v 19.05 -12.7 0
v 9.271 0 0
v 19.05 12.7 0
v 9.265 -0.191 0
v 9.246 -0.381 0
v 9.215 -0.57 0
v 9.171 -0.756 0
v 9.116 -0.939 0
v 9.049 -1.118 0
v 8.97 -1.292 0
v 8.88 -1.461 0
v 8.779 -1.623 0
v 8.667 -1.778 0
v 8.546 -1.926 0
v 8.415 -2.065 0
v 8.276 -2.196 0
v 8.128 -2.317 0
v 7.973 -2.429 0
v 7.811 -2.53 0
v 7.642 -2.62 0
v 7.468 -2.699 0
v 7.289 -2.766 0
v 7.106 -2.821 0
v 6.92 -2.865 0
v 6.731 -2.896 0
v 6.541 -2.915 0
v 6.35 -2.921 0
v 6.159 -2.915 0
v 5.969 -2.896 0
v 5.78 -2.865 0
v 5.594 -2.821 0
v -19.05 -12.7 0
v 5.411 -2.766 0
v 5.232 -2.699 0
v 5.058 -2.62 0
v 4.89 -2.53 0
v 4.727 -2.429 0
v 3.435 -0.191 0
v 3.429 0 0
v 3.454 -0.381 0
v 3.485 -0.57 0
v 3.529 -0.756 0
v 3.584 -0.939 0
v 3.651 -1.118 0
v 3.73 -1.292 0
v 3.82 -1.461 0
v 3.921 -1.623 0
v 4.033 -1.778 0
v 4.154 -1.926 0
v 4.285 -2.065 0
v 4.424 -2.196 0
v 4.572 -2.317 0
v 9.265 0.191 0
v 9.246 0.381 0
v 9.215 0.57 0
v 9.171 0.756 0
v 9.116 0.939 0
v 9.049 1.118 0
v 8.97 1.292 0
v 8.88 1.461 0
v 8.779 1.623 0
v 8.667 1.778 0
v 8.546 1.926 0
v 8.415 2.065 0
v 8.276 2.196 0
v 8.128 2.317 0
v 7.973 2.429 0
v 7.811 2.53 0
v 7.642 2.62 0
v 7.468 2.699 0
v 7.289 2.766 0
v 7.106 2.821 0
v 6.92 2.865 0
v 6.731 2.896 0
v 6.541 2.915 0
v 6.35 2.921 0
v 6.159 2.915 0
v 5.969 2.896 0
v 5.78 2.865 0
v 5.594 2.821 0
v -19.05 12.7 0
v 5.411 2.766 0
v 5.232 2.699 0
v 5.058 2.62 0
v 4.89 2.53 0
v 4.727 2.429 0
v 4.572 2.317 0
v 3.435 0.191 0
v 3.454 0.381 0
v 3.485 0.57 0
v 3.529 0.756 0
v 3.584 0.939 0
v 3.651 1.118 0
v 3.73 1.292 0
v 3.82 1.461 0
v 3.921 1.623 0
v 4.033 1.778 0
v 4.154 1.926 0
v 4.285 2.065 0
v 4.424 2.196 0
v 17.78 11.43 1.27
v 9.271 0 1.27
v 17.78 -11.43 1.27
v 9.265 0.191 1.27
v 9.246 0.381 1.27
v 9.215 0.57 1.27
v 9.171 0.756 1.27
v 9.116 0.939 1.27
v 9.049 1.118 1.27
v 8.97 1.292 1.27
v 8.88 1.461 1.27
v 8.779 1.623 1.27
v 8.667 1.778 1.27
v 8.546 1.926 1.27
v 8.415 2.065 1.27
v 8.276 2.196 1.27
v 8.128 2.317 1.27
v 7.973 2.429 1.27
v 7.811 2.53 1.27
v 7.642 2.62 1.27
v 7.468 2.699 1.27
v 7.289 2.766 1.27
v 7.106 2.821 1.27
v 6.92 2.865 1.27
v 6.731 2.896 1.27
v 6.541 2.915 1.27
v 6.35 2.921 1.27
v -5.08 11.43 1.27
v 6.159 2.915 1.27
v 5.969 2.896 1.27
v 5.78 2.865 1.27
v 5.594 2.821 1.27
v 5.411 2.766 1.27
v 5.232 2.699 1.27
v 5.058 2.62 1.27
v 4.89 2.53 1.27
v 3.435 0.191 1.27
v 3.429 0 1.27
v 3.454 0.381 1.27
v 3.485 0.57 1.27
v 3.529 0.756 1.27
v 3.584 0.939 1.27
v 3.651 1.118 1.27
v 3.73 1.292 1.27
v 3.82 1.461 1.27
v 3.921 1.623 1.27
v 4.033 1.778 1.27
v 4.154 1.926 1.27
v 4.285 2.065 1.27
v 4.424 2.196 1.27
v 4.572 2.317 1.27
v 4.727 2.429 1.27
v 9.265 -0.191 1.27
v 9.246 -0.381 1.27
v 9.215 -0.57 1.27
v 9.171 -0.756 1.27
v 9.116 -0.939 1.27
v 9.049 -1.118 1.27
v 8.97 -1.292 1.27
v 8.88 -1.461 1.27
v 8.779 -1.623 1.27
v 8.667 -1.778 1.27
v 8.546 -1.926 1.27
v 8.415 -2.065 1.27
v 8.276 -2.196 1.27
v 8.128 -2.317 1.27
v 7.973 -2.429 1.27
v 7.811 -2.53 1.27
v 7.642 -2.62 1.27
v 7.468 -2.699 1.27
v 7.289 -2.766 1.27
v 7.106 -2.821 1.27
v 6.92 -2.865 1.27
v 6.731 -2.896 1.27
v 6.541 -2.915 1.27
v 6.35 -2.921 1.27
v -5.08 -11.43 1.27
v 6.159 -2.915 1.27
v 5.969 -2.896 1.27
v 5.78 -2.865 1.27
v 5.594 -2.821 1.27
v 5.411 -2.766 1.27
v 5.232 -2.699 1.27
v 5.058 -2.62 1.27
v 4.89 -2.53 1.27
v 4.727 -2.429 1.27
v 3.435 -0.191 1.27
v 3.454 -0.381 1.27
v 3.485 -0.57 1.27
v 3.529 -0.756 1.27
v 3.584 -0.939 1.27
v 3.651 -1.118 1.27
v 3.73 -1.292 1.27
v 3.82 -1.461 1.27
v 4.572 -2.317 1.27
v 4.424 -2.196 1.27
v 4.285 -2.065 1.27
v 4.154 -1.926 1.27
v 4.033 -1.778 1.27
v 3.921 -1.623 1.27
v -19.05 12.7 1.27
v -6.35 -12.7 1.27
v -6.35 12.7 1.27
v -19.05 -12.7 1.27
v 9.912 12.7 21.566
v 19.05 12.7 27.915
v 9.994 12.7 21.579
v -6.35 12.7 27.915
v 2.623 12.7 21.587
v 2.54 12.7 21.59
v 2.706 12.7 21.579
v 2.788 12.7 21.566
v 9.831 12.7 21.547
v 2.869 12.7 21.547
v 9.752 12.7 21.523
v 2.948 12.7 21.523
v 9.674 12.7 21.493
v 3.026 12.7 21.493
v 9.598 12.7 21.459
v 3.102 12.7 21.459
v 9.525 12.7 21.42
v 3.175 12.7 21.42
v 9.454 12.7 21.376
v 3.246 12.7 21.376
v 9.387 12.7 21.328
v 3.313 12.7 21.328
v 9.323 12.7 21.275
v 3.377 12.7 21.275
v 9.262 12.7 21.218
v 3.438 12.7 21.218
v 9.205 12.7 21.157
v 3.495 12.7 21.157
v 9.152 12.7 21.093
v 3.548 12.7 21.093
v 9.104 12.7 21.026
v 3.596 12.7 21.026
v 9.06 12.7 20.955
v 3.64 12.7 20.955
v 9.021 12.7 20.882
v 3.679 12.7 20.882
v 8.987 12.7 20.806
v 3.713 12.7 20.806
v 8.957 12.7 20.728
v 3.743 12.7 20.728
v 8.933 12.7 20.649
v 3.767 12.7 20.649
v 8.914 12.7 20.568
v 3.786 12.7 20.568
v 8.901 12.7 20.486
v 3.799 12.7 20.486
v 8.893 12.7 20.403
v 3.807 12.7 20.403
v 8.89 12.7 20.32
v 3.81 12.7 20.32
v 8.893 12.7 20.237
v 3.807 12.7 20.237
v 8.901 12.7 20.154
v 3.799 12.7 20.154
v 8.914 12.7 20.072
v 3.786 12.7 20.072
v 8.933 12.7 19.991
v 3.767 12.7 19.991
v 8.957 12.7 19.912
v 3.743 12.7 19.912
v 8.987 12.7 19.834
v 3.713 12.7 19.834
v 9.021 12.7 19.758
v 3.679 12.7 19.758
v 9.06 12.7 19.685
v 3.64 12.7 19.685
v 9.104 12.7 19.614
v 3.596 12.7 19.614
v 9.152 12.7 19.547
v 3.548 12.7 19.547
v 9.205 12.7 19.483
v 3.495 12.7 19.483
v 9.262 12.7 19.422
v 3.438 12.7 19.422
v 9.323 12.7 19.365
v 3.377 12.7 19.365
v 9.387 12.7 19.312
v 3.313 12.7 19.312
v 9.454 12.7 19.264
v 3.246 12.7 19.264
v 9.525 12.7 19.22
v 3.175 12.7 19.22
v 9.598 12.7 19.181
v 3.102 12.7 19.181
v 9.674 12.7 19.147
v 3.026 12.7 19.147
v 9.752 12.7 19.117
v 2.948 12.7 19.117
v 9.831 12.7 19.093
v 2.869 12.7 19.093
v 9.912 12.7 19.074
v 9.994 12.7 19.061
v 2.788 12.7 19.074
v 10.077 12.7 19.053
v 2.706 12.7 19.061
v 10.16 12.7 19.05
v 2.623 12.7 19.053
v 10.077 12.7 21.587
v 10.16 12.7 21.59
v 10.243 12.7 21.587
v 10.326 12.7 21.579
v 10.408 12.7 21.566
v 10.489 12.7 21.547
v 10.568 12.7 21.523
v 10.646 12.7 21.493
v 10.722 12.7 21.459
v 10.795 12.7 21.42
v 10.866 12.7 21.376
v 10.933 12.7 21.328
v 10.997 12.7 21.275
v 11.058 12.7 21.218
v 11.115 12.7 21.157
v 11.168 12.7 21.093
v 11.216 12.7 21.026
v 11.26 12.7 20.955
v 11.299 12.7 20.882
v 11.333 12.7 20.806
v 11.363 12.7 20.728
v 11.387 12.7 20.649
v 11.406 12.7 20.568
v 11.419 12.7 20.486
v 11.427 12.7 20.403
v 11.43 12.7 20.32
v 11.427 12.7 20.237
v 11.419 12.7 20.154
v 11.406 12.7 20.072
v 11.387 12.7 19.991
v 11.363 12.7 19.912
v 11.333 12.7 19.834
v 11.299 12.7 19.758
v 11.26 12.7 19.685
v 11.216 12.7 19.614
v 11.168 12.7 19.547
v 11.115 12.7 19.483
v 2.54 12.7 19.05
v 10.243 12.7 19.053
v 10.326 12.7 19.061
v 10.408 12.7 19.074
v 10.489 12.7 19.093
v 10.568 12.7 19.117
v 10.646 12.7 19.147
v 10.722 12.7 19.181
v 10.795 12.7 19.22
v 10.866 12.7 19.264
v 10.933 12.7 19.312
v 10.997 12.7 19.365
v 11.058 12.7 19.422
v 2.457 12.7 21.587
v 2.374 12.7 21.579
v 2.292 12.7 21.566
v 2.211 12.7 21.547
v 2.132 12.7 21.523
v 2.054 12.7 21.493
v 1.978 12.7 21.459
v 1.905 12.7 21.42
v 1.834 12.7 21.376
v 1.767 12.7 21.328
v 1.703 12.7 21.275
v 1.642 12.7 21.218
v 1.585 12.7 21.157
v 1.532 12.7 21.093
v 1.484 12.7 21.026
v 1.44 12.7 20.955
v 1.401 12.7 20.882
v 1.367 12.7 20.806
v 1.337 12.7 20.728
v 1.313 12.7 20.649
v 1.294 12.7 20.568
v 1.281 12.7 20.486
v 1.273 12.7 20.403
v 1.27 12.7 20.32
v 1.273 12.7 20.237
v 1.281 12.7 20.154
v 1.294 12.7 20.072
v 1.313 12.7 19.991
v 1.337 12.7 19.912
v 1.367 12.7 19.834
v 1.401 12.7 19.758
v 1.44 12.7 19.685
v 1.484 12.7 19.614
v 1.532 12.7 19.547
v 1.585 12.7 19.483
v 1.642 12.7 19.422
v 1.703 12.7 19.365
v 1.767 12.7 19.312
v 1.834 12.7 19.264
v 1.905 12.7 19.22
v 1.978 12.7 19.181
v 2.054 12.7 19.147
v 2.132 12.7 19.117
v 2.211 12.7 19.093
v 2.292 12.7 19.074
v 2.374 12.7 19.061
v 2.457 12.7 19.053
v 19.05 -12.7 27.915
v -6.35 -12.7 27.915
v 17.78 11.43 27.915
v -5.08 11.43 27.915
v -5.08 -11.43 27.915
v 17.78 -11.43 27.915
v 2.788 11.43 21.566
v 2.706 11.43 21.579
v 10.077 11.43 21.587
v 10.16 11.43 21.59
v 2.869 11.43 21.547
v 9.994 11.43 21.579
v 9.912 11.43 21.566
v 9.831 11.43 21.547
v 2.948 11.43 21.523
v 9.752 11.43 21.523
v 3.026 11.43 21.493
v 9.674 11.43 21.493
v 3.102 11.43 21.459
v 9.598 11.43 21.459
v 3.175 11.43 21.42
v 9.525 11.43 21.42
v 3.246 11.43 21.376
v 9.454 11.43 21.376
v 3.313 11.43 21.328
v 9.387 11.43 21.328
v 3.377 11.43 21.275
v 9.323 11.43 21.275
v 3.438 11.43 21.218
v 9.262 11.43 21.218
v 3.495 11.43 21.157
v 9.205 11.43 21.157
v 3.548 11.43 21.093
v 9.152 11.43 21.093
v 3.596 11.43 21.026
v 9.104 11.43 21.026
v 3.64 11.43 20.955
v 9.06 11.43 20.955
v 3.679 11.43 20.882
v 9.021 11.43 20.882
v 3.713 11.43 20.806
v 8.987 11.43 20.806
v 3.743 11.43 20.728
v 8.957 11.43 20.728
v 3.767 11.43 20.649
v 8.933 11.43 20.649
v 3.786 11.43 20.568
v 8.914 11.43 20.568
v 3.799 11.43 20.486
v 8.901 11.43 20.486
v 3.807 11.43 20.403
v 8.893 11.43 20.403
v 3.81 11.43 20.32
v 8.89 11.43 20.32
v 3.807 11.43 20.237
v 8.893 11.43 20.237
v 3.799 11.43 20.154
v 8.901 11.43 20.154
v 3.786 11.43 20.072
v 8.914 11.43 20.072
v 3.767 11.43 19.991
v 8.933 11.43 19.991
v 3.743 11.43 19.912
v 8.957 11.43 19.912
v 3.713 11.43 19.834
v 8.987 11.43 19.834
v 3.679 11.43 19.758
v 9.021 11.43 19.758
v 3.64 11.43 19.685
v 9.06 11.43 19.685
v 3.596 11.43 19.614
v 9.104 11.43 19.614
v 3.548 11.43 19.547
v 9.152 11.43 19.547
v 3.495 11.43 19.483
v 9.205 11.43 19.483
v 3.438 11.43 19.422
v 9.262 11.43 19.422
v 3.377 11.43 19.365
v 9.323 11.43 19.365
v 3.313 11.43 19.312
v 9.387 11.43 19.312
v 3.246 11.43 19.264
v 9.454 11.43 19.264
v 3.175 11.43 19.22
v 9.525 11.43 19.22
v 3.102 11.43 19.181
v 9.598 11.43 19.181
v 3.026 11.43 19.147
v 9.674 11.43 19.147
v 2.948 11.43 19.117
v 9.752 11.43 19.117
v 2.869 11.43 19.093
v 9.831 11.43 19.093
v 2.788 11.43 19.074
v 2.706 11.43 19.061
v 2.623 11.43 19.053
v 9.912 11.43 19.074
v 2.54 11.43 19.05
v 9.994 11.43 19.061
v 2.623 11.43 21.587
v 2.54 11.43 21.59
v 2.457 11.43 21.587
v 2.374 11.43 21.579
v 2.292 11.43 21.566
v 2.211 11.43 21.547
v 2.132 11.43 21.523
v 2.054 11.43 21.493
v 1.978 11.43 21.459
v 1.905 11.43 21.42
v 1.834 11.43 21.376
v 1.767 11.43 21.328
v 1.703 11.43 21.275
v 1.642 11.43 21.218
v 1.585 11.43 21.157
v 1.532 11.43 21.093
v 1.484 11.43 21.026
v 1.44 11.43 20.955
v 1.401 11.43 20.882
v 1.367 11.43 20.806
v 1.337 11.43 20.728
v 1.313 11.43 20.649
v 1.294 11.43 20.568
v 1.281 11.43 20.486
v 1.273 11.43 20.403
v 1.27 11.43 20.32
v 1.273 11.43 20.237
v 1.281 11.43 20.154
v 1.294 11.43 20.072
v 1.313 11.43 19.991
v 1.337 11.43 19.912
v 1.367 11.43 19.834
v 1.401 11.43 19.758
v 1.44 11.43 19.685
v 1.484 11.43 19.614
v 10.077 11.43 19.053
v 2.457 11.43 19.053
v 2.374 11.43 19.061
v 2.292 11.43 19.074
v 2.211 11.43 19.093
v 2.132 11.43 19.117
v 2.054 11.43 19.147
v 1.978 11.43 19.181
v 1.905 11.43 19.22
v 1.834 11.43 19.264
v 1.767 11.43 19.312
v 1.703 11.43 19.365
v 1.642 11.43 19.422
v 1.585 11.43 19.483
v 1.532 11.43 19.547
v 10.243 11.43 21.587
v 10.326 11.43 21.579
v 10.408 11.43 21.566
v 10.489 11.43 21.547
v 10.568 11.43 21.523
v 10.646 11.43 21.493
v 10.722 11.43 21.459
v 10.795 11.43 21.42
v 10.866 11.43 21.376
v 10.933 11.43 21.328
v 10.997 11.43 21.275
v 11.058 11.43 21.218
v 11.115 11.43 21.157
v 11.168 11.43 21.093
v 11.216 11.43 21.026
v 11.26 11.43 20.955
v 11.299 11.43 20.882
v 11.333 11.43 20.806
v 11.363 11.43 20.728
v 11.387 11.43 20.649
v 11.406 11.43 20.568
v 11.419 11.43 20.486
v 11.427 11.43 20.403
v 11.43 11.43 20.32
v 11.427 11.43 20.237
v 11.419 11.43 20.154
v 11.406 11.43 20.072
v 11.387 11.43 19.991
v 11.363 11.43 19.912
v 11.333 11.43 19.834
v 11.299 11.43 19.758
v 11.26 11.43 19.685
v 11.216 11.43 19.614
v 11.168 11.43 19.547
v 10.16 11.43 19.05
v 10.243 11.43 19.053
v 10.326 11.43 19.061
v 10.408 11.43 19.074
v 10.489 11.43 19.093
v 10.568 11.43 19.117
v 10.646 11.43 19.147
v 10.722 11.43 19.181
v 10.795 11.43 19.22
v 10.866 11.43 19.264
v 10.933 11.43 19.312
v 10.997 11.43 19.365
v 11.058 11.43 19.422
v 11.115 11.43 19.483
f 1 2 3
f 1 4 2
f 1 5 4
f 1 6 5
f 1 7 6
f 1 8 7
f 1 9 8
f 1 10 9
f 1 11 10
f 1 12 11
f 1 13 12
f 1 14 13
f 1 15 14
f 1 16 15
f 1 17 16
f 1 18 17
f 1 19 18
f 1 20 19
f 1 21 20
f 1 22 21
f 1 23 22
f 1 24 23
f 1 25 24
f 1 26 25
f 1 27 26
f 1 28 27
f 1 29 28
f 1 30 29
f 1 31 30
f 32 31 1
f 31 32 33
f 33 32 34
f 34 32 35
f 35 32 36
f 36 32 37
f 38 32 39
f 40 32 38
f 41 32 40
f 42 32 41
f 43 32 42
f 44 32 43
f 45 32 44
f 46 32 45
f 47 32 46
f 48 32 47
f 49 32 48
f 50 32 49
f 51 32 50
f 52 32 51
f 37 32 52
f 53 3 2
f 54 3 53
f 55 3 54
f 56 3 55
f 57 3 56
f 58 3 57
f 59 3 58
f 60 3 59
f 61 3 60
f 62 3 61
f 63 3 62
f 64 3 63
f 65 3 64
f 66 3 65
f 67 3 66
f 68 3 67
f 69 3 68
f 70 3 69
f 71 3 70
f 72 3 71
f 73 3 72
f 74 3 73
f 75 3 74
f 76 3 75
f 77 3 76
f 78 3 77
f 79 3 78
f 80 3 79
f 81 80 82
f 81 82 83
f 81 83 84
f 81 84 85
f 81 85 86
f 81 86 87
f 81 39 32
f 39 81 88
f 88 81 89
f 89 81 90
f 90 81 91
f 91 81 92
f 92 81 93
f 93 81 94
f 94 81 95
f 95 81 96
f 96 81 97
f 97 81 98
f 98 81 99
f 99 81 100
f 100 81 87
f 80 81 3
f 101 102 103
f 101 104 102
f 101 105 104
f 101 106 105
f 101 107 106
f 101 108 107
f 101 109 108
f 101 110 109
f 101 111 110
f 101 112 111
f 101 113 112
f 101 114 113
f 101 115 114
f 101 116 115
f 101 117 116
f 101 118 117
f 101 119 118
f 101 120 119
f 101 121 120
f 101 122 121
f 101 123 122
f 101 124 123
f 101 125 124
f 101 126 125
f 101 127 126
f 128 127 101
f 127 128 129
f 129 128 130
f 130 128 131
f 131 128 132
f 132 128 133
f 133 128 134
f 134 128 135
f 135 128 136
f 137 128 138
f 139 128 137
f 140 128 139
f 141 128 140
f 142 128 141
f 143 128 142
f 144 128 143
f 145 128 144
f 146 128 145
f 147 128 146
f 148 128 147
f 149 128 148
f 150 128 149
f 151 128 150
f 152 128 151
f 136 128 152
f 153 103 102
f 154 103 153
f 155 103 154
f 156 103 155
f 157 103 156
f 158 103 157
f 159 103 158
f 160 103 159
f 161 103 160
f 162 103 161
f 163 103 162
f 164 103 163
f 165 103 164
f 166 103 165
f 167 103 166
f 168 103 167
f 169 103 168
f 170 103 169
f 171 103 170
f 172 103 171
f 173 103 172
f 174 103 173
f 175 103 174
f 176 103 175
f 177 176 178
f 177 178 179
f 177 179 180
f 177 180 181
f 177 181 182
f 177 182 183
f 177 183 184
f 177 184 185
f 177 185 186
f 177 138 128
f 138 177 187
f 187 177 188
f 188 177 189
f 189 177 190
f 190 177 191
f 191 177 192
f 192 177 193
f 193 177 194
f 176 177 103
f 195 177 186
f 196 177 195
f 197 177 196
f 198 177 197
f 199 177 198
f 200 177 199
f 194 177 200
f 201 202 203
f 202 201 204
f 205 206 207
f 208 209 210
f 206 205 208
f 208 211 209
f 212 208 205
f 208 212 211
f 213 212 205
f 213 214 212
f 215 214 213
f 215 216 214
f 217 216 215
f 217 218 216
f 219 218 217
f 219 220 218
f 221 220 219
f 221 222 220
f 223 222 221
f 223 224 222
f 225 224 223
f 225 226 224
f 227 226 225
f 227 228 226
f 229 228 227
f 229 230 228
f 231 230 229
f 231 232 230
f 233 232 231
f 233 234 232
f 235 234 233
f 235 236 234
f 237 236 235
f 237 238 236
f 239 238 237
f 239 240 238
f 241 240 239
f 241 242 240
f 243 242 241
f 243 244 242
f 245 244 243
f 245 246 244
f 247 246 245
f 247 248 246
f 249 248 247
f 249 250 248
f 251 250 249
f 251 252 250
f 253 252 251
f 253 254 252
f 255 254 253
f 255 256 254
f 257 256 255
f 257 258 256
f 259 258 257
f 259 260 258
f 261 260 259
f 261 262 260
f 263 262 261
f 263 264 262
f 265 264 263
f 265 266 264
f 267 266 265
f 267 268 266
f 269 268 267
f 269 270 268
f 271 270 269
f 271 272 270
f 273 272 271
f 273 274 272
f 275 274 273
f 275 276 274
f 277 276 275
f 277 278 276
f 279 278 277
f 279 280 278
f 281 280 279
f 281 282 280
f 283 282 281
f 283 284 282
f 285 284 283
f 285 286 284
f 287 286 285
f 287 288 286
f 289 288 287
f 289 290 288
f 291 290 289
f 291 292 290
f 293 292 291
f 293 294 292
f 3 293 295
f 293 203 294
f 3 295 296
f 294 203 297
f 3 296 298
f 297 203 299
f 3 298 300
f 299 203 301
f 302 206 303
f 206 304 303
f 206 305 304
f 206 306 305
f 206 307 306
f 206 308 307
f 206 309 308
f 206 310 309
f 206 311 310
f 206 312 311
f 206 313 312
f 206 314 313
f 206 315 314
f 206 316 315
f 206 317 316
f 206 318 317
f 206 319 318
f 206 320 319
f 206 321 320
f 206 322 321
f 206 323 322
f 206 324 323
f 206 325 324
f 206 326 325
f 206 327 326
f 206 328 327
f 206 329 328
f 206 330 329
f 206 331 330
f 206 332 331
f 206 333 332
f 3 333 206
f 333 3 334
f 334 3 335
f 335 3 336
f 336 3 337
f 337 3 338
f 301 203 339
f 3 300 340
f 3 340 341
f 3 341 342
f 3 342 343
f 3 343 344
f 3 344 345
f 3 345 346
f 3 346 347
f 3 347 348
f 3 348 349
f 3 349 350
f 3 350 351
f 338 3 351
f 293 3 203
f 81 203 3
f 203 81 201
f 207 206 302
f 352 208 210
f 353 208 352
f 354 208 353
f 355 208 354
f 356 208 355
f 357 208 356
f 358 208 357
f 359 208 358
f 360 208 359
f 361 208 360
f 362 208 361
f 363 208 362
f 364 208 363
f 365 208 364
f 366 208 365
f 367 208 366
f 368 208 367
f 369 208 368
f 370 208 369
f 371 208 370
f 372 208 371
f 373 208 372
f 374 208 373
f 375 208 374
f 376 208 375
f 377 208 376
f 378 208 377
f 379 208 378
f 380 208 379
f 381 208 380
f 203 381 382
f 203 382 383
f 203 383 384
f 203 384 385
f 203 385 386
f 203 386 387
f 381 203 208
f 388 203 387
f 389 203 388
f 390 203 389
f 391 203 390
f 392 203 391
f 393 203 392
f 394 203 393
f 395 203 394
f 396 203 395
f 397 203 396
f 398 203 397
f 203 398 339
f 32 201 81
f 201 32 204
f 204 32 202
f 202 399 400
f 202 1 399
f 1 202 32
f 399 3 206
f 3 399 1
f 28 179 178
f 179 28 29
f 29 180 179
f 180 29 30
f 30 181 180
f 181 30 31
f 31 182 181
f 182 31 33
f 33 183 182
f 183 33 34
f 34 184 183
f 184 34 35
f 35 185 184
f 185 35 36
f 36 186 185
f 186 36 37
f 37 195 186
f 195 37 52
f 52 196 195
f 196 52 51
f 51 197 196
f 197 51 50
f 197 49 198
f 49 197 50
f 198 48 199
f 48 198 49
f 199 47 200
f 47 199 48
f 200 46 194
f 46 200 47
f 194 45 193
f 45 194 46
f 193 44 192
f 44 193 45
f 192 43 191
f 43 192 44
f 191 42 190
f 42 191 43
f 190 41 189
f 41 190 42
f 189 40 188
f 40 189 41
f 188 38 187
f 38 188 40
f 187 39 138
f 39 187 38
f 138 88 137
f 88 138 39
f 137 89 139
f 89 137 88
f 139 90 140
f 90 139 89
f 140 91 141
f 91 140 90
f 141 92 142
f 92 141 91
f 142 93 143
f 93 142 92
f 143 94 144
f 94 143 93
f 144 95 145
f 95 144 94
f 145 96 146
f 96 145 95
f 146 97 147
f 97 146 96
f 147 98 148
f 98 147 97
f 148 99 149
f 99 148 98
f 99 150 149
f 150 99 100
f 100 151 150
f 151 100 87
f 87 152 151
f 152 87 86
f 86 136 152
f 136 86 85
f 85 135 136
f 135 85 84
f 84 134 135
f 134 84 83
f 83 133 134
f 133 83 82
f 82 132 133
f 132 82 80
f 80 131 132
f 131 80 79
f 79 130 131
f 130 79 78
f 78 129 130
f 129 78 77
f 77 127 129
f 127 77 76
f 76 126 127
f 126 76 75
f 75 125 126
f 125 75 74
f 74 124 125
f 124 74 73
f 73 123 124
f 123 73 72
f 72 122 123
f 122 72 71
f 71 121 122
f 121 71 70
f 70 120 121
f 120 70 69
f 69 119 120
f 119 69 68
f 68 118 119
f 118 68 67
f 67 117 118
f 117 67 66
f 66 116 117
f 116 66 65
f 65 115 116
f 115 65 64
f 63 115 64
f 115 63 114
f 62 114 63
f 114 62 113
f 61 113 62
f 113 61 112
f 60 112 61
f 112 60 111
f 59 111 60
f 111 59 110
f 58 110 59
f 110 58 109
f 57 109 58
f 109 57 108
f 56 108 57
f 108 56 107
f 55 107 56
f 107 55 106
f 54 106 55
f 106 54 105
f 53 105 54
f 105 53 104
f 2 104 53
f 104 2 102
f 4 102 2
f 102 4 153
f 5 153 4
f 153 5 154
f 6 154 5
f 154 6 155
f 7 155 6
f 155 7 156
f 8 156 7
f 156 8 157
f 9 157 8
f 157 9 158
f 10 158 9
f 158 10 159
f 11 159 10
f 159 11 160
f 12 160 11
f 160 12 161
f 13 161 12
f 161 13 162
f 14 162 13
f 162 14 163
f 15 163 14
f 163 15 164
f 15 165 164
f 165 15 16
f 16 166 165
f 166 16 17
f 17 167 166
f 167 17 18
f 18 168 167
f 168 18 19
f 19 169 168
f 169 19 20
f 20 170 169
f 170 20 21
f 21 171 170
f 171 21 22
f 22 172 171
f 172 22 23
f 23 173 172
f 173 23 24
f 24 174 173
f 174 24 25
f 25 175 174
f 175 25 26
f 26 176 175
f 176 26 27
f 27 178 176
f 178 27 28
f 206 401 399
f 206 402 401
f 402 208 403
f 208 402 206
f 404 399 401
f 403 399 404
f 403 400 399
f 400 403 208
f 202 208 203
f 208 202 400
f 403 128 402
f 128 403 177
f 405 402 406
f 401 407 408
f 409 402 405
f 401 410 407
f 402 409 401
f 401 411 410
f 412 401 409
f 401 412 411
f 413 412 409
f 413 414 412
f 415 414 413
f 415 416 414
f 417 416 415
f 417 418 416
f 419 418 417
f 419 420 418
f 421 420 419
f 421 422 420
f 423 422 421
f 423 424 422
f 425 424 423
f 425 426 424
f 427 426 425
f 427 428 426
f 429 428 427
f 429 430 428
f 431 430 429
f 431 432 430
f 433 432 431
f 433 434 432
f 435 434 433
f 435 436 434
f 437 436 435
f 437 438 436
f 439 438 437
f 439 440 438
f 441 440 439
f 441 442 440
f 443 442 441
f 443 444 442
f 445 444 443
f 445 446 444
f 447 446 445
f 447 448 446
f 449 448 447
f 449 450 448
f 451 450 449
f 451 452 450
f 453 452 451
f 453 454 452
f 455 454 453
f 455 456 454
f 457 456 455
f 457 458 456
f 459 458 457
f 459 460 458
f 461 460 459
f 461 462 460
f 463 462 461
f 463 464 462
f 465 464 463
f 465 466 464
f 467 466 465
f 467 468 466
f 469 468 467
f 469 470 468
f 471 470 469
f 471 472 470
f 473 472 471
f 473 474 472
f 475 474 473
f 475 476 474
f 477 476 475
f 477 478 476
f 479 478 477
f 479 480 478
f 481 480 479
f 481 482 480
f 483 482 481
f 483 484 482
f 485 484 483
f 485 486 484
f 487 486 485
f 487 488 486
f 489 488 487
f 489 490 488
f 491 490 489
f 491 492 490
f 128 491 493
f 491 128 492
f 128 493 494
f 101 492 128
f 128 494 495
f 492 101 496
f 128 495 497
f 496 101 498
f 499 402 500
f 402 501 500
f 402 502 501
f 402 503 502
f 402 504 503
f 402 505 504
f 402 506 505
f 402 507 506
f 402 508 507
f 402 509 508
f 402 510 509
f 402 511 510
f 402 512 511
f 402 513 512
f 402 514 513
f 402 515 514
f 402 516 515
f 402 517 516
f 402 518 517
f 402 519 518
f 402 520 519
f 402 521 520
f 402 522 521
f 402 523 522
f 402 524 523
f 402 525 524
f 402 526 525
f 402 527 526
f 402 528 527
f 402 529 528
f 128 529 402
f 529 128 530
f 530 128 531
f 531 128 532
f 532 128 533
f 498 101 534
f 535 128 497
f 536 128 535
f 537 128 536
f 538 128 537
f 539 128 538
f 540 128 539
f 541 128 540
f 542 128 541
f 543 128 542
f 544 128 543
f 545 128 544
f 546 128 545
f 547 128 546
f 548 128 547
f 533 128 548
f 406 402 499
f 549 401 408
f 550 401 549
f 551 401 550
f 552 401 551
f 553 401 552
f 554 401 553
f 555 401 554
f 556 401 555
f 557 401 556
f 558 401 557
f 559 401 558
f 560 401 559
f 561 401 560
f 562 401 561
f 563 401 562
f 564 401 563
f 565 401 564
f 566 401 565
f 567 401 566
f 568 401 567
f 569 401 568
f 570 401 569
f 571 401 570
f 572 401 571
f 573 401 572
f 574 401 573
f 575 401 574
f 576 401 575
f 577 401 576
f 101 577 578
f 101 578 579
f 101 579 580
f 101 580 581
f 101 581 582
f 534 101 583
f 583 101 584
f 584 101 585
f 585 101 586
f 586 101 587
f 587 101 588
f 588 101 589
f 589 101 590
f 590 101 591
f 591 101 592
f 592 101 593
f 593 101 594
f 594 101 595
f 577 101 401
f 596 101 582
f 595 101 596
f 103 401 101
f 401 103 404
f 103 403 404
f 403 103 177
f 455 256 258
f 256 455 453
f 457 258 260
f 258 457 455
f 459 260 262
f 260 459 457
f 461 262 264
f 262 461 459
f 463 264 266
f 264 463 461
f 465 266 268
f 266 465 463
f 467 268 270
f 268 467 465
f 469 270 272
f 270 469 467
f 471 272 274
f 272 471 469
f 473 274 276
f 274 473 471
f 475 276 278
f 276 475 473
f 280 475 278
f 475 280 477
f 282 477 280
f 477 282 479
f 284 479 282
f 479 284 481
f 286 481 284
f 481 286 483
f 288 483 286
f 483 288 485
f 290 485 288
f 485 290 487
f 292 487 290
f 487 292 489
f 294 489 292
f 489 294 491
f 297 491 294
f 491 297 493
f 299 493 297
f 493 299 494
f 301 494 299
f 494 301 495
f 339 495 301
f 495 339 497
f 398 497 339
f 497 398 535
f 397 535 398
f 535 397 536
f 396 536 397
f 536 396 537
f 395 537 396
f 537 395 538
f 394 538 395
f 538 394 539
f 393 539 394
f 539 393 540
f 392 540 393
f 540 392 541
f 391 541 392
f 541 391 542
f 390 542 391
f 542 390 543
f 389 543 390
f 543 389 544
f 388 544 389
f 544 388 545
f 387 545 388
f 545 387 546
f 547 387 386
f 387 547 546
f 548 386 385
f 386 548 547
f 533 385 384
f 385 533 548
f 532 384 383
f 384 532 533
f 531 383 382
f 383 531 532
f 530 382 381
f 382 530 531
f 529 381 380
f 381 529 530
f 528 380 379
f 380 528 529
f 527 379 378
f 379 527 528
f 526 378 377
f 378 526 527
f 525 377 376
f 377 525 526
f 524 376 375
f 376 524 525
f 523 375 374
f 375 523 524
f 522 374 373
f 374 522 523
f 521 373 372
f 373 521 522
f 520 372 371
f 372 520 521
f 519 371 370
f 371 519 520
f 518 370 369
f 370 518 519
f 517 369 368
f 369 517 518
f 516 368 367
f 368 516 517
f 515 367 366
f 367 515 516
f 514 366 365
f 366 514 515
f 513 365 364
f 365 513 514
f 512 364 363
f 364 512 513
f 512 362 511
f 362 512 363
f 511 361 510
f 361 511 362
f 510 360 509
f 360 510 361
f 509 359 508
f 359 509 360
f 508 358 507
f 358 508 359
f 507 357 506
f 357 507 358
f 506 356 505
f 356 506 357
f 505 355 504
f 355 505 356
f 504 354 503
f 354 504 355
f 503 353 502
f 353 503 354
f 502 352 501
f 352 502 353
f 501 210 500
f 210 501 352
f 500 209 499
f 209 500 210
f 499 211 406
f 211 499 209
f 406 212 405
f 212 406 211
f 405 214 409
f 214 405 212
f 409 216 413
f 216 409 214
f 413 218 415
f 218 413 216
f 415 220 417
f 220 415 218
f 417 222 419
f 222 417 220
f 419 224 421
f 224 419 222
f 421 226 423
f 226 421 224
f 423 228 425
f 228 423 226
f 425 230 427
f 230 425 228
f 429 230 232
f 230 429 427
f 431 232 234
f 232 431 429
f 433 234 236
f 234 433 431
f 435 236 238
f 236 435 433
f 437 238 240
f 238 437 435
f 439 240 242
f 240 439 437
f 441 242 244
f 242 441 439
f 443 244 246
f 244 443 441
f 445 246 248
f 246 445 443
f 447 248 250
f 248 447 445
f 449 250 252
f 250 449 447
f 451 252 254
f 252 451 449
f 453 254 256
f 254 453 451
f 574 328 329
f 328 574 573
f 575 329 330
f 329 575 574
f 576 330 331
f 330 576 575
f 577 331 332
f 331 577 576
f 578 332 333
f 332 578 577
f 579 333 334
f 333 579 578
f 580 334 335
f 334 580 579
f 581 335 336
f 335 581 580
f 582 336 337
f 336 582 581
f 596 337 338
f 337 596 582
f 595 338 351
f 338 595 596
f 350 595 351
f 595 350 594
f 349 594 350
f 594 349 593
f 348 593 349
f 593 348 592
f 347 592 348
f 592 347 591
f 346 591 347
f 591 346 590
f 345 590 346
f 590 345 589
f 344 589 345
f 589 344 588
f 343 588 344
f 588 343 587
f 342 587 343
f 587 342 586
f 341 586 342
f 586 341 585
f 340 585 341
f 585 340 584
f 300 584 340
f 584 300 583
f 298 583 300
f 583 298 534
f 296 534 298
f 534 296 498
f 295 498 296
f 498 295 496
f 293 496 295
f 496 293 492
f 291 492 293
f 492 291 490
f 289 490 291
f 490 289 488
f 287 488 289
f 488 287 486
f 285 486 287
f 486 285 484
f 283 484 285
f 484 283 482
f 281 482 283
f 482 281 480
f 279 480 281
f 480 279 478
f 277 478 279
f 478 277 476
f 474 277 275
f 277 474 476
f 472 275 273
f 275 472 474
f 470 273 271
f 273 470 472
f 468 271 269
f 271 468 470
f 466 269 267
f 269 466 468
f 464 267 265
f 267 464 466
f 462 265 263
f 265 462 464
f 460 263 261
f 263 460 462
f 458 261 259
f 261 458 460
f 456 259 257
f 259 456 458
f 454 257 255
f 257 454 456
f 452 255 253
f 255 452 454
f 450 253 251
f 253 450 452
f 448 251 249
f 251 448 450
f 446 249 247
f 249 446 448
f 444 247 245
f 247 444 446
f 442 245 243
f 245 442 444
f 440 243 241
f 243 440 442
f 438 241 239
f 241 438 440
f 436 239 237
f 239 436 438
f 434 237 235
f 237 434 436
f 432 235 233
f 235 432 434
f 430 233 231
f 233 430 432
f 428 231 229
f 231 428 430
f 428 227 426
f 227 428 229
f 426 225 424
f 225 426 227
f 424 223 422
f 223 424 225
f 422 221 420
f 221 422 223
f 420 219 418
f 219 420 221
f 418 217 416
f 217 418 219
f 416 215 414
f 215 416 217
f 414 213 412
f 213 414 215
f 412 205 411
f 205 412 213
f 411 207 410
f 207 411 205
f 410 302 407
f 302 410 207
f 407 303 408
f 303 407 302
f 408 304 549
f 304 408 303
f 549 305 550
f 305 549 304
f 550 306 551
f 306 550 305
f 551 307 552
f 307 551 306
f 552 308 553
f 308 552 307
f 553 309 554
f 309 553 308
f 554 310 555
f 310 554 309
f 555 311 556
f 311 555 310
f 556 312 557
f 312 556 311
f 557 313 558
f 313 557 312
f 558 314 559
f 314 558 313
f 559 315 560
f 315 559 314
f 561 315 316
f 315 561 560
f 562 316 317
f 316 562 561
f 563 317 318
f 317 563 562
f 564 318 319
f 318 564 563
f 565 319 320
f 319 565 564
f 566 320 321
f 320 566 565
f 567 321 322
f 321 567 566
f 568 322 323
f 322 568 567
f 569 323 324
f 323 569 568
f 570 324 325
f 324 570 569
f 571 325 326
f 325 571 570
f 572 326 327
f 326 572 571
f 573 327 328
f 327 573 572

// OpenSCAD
ViewScale = [0.0254, 0.0254, 0.0254];
tvside = 780; // 780 side
tvfront = 500; // 500 front
tvbottom = 790; // 790 botton
tvindent = 150;// 150 indent
boxside = 1000;

module model_tv()
{
    linear_extrude(2000)
    square([tvfront, tvside], center=true);
}

module case()
{

    // bottom bit
    linear_extrude(50)
    difference() {
        square([tvfront+boxside, boxside], center=true);
        translate([tvfront/2, 0, 0])
        circle(230/2, $fn=96);
    }

    // main bit
    translate([tvfront/2, 0, 50])
    linear_extrude(1049)
    difference() {
        square([boxside, boxside], center=true);
        square([boxside-100, boxside-100], center=true);
    }
}

module holes()
{
    linear_extrude(200) {
        circle(50, $fn=96);
        translate([0, 300, 0])
        circle(50, $fn=96);
    }
}

module box()
{
    difference() {
        case();
        translate([tvfront/2+150, boxside/2-150, 800])
        rotate([0, 90, 90])
        holes();
    }
}

module forViewing()
{
    *color("cyan")
    model_tv();
    box();
}

module forPrinting()
{
}

scale(ViewScale)
{
    forViewing();
}
